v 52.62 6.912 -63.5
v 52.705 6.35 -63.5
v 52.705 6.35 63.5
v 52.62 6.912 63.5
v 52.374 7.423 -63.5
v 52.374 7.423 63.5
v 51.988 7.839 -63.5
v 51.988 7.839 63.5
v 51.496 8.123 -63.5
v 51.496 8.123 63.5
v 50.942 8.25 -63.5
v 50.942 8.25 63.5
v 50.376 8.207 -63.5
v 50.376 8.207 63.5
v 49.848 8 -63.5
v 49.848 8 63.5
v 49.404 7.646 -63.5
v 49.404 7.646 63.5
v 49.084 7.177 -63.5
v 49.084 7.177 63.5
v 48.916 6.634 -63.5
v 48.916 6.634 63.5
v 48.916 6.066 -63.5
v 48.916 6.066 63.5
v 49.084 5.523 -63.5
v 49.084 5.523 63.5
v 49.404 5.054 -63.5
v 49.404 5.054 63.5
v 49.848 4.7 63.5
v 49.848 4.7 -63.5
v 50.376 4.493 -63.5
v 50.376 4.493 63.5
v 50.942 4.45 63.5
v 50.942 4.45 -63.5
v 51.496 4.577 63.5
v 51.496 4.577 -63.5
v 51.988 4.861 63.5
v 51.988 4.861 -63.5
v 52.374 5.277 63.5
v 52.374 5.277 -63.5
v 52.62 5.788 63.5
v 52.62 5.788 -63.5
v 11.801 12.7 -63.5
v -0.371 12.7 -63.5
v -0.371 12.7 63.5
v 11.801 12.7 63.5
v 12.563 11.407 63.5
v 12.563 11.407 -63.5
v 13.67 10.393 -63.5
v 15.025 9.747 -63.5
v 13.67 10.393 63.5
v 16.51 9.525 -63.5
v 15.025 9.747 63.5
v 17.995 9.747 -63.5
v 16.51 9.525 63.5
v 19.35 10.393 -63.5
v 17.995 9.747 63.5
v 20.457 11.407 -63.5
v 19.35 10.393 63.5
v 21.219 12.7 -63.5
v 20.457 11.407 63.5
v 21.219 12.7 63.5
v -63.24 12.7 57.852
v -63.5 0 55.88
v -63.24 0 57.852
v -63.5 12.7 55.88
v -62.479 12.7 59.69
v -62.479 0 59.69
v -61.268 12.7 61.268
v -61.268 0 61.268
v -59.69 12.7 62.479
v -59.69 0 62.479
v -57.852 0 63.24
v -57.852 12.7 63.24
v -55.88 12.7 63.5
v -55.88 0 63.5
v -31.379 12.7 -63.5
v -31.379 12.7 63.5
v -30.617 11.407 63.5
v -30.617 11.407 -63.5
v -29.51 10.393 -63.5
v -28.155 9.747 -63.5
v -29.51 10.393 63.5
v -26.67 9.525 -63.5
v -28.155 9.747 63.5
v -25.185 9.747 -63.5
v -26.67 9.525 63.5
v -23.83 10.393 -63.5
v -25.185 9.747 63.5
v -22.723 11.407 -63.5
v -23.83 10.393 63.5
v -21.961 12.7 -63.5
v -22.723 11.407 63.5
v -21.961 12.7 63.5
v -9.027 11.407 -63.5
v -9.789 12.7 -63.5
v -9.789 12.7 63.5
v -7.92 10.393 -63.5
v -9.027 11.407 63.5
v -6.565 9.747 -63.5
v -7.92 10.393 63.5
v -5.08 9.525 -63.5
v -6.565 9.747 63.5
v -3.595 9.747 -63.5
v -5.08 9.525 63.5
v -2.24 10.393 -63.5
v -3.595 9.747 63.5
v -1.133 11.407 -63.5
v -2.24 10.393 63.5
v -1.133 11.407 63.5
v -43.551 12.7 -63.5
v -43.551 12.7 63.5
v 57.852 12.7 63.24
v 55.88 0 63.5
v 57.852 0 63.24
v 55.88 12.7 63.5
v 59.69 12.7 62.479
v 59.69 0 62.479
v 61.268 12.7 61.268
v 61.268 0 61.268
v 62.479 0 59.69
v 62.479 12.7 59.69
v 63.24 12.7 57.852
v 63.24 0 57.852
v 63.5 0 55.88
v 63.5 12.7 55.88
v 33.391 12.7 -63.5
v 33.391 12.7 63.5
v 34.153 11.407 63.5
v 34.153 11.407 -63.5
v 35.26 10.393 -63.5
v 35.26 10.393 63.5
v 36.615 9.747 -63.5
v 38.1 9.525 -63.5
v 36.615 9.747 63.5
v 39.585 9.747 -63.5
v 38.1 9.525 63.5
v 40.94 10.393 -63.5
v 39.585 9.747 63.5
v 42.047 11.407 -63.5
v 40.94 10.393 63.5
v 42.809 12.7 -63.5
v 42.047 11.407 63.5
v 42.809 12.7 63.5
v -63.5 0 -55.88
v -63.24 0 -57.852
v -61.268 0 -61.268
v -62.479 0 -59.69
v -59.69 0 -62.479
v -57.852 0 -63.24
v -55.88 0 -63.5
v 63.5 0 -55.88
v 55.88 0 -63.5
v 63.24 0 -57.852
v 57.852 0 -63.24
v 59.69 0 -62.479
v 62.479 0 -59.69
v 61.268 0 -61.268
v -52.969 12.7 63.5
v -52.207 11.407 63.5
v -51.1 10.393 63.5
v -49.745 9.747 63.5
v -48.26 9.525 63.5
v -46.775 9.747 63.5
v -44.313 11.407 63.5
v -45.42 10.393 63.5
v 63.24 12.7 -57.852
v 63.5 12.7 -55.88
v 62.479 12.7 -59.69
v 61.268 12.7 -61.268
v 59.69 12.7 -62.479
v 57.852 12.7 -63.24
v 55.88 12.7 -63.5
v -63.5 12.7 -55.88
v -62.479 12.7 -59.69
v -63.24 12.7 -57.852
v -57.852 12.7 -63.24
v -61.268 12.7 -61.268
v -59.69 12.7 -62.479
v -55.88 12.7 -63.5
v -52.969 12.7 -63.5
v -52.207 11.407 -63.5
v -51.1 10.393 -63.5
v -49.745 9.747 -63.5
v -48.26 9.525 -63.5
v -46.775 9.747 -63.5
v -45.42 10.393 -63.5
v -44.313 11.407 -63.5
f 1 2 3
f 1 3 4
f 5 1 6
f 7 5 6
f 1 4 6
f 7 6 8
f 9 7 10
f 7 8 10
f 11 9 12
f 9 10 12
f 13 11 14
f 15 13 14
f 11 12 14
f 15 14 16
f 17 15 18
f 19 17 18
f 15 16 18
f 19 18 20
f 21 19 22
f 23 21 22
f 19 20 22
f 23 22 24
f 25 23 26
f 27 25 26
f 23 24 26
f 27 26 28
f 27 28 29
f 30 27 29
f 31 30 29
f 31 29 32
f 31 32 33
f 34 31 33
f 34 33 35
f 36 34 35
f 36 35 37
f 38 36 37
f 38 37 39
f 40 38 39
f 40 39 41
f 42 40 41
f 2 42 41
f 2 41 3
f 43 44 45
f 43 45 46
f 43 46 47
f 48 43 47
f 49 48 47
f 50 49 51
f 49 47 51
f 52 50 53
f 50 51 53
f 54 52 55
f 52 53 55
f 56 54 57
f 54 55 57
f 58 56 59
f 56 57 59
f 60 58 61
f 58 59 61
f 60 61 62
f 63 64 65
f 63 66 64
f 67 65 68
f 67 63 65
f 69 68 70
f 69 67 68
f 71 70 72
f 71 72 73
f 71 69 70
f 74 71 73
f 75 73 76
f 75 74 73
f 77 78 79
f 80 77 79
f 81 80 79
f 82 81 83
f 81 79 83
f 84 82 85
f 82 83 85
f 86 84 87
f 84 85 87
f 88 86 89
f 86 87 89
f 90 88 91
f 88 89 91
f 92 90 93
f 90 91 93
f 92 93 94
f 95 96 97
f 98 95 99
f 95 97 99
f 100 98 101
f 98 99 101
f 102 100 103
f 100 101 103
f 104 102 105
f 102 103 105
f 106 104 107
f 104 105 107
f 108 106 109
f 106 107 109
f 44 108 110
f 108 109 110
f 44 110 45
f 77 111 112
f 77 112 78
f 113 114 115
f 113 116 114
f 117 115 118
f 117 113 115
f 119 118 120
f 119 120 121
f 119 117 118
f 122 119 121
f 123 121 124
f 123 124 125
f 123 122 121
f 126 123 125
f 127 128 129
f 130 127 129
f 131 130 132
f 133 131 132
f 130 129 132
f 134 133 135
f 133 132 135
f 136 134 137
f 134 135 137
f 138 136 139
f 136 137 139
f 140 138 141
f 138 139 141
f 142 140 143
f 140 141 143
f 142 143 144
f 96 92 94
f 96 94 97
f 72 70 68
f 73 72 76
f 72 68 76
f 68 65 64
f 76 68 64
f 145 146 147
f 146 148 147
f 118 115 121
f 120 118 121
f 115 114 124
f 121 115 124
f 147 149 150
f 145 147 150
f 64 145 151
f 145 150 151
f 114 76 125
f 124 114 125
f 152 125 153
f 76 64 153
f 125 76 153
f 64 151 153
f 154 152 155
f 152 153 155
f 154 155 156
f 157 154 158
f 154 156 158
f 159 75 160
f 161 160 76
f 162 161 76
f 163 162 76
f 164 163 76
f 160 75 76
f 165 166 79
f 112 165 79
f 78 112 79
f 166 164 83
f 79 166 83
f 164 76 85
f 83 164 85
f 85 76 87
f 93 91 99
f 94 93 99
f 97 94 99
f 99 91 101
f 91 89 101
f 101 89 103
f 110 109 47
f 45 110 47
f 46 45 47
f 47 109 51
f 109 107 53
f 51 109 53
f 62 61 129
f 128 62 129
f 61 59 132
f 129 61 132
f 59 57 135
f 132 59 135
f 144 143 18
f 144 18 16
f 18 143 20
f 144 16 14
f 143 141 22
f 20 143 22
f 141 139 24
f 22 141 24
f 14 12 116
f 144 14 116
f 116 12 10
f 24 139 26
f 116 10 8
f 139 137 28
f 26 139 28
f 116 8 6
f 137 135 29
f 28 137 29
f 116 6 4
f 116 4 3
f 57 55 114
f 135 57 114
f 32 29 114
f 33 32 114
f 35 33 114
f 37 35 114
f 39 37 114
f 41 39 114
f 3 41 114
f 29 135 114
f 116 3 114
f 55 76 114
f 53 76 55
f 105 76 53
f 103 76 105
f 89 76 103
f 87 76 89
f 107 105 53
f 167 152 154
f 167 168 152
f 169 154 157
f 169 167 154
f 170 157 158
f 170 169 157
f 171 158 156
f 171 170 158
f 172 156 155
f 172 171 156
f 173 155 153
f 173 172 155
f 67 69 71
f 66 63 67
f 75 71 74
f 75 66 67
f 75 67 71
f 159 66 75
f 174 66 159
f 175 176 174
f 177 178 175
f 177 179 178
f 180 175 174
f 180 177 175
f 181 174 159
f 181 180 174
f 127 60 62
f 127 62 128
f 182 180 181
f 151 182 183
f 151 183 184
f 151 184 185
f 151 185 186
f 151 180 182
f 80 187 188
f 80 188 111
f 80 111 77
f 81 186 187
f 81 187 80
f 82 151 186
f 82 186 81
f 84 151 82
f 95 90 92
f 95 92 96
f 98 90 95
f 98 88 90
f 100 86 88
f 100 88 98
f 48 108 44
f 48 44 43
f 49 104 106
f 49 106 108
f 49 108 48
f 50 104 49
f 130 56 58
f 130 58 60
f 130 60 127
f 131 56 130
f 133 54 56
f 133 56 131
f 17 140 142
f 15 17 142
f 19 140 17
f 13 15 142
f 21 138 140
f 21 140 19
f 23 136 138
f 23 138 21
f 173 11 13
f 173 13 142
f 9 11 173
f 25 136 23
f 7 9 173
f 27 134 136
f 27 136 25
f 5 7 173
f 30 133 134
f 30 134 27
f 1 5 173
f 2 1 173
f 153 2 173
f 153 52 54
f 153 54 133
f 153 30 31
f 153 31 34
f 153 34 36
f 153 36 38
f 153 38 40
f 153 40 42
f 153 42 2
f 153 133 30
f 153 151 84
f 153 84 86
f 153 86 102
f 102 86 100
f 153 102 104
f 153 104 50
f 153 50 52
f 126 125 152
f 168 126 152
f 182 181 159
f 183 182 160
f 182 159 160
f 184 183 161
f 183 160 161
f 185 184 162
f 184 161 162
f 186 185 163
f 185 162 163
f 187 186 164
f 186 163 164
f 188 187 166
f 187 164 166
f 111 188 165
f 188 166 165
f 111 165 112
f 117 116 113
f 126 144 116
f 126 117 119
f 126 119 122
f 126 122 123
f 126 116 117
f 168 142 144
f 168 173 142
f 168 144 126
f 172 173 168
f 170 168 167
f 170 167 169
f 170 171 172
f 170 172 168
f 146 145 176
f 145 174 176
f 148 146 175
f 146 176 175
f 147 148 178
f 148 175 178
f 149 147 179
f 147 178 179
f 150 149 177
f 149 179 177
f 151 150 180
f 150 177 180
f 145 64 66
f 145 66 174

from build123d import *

# Parameters (mm, degrees)
SKETCH2_W           = 127
SKETCH2_H           = 127
BOSS_EXTRUDE1_DEPTH = 12.7
FILLET1_R           = 7.62
SKETCH3_R           = 5.08
CUT_EXTRUDE1_DEPTH  = 143.557146436
LPATTERN1_COUNT     = 5
LPATTERN1_PITCH     = 21.59
SKETCH3_3_R         = 1.905
SKETCH3_3_R_2       = 5.08
CUT_EXTRUDE2_DEPTH  = 143.557146436


with BuildPart() as part:
    # Sketch2 → Boss-Extrude1 (new body)
    with BuildSketch(Plane(origin=(0, 0, 0), x_dir=(1, 0, 0), z_dir=(0, 1, 0))):
        Rectangle(SKETCH2_W, SKETCH2_H)
    extrude(amount=BOSS_EXTRUDE1_DEPTH)

    # Fillet1
    fillet1_edges = [part.edges().sort_by_distance(p)[0] for p in [
        (63.5, 6.35, 63.5),
        (-63.5, 6.35, 63.5),
        (-63.5, 6.35, -63.5),
        (63.5, 6.35, -63.5),
    ]]
    fillet(fillet1_edges, radius=FILLET1_R)

    # Sketch3 → Cut-Extrude1 (cut, through all)
    with BuildSketch(Plane.XY.offset(63.5)):
        with Locations((38.1, 14.605)):
            Circle(SKETCH3_R)
    cut_extrude1 = extrude(amount=-CUT_EXTRUDE1_DEPTH, mode=Mode.SUBTRACT)

    # LPattern1: Cut-Extrude1 ×5
    with Locations(*[(-i * LPATTERN1_PITCH, 0, 0) for i in range(1, LPATTERN1_COUNT)]):
        add(cut_extrude1, mode=Mode.SUBTRACT)

    # Sketch3<3> → Cut-Extrude2 (cut, through all)
    with BuildSketch(Plane.XY.offset(63.5)):
        with Locations((50.8, 6.35)):
            Circle(SKETCH3_3_R)
        with Locations((38.1, 14.605)):
            Circle(SKETCH3_3_R_2)
    extrude(amount=-CUT_EXTRUDE2_DEPTH, mode=Mode.SUBTRACT)


solid = part.part
